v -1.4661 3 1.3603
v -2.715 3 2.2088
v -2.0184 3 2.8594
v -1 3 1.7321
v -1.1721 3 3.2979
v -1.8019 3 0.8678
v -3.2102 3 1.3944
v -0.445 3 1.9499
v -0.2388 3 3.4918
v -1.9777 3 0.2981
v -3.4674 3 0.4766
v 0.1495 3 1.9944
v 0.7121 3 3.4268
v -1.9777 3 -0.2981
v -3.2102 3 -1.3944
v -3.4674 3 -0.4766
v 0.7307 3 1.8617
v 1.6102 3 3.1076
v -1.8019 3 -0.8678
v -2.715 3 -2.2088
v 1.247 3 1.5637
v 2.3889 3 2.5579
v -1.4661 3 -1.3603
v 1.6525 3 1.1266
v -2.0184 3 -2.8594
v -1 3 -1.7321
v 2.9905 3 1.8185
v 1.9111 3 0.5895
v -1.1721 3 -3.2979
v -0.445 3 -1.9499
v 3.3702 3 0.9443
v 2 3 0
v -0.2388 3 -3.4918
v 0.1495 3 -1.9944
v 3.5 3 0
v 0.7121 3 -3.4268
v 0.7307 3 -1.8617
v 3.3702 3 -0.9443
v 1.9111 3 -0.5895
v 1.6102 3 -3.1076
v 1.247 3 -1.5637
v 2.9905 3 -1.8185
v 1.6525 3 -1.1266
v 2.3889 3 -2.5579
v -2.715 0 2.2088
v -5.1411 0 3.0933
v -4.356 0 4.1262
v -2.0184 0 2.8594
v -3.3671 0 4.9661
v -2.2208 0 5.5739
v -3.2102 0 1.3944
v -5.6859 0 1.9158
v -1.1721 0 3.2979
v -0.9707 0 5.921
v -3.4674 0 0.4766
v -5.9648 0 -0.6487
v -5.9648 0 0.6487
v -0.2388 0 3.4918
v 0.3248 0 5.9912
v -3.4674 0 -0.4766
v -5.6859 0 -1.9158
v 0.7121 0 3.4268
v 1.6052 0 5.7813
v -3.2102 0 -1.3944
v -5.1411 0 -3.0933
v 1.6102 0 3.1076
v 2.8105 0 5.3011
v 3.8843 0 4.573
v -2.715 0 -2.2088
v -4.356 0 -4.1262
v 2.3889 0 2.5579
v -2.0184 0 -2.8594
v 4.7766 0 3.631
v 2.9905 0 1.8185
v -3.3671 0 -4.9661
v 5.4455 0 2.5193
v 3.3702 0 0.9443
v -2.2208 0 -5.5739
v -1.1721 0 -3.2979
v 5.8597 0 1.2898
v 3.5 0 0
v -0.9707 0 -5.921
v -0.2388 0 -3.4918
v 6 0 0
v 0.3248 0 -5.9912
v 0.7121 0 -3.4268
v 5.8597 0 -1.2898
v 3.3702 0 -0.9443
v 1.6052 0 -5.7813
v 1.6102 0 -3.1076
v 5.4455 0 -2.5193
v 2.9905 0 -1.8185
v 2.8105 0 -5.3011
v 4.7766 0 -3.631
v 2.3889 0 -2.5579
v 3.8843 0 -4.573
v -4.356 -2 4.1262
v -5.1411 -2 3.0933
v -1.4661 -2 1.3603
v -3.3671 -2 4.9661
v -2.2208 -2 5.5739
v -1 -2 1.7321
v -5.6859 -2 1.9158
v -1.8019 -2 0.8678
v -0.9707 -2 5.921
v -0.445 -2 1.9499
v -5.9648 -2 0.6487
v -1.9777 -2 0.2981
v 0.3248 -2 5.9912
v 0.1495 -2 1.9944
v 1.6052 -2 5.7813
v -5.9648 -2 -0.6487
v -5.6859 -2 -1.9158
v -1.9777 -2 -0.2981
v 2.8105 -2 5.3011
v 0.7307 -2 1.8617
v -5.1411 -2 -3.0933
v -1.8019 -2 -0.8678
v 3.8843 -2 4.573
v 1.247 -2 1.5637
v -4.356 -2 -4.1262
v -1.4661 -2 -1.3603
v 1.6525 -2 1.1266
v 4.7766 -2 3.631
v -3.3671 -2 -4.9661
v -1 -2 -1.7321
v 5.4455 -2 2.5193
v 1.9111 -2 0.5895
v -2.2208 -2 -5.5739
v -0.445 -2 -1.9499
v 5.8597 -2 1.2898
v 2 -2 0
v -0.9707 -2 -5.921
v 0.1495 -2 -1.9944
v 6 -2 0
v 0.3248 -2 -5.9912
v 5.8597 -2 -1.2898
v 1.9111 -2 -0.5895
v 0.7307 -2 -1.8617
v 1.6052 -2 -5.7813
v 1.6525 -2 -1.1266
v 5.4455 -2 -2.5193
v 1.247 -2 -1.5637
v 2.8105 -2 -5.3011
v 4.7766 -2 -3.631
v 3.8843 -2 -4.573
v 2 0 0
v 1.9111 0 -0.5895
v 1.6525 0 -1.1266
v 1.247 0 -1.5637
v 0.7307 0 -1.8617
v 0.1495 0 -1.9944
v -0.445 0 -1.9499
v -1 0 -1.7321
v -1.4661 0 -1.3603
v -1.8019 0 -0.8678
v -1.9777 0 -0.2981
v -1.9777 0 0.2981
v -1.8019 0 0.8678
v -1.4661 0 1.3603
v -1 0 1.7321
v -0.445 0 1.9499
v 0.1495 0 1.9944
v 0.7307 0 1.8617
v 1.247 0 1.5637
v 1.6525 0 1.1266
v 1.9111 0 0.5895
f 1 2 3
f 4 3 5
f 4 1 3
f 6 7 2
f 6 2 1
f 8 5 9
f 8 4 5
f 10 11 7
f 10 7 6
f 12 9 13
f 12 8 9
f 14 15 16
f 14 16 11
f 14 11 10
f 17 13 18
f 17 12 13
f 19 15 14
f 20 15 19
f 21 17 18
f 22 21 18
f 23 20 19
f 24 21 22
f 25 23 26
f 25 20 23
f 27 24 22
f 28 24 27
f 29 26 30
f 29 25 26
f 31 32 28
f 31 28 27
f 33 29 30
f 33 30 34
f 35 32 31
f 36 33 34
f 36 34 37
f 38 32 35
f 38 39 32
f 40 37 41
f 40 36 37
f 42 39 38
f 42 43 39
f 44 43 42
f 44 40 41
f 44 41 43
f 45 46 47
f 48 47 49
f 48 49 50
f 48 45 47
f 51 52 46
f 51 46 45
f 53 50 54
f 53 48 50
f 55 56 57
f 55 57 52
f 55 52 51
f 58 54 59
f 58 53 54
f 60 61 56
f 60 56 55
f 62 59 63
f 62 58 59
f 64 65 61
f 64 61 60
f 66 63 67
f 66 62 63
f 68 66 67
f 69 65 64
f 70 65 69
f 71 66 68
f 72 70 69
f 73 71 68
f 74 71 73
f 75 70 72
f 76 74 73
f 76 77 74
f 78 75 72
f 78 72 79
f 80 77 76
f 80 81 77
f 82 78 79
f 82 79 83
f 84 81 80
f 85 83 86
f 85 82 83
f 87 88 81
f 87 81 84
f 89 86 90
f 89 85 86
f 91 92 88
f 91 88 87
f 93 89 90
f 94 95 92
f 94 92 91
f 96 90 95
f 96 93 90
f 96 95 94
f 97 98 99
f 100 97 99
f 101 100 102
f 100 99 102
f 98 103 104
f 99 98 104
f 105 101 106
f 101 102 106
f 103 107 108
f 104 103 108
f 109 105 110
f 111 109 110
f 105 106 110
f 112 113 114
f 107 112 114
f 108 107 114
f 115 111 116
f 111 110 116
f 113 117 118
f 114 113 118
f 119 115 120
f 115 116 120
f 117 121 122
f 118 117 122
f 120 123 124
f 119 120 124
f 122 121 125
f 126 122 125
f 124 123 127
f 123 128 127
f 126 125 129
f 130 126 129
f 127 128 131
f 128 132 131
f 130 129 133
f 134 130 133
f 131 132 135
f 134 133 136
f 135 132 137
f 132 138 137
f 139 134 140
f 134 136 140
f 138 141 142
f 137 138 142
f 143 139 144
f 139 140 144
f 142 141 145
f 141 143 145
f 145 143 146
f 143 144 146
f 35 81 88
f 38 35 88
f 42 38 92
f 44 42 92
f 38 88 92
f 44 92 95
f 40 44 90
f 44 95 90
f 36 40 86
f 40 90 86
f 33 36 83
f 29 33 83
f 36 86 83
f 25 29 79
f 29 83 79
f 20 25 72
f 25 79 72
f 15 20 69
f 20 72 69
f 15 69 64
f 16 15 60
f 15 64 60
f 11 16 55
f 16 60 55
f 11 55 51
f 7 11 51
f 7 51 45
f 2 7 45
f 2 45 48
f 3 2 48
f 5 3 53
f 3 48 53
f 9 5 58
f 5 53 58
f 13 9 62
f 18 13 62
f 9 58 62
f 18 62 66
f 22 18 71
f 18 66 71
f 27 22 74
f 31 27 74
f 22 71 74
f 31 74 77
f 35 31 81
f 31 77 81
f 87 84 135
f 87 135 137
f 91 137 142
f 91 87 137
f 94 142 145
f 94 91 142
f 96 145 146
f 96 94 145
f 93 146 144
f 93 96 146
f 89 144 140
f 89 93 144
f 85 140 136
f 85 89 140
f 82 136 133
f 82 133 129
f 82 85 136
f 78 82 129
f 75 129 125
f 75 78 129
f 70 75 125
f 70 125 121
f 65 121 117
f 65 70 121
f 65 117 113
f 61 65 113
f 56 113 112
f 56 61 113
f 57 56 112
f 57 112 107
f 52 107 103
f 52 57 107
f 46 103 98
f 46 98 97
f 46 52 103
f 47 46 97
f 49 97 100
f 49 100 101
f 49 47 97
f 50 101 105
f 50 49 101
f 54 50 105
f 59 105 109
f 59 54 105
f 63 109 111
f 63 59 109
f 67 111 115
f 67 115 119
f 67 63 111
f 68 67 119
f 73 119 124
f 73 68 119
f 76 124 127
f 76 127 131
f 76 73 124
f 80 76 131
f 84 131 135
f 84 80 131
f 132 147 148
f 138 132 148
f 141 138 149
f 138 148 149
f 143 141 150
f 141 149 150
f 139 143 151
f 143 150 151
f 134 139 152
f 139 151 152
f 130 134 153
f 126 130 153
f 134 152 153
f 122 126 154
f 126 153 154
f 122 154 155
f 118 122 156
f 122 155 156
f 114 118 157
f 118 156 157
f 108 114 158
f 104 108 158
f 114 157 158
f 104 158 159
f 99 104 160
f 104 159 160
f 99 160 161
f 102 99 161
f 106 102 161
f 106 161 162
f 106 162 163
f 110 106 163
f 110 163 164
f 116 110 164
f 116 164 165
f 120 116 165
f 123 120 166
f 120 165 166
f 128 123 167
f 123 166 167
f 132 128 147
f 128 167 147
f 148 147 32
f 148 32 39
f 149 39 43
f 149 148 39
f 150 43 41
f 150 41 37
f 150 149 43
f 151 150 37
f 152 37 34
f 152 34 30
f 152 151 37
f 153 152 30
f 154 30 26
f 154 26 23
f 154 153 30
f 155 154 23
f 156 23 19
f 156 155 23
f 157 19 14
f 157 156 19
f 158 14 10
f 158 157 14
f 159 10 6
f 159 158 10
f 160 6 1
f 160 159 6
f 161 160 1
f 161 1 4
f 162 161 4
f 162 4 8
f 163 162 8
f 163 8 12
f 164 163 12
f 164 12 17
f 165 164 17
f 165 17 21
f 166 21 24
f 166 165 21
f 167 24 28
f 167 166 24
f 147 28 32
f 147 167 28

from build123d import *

# Parameters (mm, degrees)
SKETCH_1_R      = 3.5
SKETCH_1_R_2    = 2
EXTRUDE_1_DEPTH = 3
EXTRUDE_START   = -2
SKETCH_1_3_R    = 6
SKETCH_1_3_R_2  = 2
EXTRUDE_2_DEPTH = 2


with BuildPart() as part:
    # 草图1 → 凸台-拉伸1 (new body)
    with BuildSketch(Plane(origin=(0, 0, 0), x_dir=(1, 0, 0), z_dir=(0, 1, 0))):
        Circle(SKETCH_1_R)
        Circle(SKETCH_1_R_2, mode=Mode.SUBTRACT)
    extrude(amount=EXTRUDE_1_DEPTH)

    # 草图1<3> → 凸台-拉伸2 (add)
    with BuildSketch(Plane(origin=(0, 0, 0), x_dir=(1, 0, 0), z_dir=(0, 1, 0)).offset(EXTRUDE_START)):
        Circle(SKETCH_1_3_R)
        Circle(SKETCH_1_3_R_2, mode=Mode.SUBTRACT)
    extrude(amount=EXTRUDE_2_DEPTH)


solid = part.part
